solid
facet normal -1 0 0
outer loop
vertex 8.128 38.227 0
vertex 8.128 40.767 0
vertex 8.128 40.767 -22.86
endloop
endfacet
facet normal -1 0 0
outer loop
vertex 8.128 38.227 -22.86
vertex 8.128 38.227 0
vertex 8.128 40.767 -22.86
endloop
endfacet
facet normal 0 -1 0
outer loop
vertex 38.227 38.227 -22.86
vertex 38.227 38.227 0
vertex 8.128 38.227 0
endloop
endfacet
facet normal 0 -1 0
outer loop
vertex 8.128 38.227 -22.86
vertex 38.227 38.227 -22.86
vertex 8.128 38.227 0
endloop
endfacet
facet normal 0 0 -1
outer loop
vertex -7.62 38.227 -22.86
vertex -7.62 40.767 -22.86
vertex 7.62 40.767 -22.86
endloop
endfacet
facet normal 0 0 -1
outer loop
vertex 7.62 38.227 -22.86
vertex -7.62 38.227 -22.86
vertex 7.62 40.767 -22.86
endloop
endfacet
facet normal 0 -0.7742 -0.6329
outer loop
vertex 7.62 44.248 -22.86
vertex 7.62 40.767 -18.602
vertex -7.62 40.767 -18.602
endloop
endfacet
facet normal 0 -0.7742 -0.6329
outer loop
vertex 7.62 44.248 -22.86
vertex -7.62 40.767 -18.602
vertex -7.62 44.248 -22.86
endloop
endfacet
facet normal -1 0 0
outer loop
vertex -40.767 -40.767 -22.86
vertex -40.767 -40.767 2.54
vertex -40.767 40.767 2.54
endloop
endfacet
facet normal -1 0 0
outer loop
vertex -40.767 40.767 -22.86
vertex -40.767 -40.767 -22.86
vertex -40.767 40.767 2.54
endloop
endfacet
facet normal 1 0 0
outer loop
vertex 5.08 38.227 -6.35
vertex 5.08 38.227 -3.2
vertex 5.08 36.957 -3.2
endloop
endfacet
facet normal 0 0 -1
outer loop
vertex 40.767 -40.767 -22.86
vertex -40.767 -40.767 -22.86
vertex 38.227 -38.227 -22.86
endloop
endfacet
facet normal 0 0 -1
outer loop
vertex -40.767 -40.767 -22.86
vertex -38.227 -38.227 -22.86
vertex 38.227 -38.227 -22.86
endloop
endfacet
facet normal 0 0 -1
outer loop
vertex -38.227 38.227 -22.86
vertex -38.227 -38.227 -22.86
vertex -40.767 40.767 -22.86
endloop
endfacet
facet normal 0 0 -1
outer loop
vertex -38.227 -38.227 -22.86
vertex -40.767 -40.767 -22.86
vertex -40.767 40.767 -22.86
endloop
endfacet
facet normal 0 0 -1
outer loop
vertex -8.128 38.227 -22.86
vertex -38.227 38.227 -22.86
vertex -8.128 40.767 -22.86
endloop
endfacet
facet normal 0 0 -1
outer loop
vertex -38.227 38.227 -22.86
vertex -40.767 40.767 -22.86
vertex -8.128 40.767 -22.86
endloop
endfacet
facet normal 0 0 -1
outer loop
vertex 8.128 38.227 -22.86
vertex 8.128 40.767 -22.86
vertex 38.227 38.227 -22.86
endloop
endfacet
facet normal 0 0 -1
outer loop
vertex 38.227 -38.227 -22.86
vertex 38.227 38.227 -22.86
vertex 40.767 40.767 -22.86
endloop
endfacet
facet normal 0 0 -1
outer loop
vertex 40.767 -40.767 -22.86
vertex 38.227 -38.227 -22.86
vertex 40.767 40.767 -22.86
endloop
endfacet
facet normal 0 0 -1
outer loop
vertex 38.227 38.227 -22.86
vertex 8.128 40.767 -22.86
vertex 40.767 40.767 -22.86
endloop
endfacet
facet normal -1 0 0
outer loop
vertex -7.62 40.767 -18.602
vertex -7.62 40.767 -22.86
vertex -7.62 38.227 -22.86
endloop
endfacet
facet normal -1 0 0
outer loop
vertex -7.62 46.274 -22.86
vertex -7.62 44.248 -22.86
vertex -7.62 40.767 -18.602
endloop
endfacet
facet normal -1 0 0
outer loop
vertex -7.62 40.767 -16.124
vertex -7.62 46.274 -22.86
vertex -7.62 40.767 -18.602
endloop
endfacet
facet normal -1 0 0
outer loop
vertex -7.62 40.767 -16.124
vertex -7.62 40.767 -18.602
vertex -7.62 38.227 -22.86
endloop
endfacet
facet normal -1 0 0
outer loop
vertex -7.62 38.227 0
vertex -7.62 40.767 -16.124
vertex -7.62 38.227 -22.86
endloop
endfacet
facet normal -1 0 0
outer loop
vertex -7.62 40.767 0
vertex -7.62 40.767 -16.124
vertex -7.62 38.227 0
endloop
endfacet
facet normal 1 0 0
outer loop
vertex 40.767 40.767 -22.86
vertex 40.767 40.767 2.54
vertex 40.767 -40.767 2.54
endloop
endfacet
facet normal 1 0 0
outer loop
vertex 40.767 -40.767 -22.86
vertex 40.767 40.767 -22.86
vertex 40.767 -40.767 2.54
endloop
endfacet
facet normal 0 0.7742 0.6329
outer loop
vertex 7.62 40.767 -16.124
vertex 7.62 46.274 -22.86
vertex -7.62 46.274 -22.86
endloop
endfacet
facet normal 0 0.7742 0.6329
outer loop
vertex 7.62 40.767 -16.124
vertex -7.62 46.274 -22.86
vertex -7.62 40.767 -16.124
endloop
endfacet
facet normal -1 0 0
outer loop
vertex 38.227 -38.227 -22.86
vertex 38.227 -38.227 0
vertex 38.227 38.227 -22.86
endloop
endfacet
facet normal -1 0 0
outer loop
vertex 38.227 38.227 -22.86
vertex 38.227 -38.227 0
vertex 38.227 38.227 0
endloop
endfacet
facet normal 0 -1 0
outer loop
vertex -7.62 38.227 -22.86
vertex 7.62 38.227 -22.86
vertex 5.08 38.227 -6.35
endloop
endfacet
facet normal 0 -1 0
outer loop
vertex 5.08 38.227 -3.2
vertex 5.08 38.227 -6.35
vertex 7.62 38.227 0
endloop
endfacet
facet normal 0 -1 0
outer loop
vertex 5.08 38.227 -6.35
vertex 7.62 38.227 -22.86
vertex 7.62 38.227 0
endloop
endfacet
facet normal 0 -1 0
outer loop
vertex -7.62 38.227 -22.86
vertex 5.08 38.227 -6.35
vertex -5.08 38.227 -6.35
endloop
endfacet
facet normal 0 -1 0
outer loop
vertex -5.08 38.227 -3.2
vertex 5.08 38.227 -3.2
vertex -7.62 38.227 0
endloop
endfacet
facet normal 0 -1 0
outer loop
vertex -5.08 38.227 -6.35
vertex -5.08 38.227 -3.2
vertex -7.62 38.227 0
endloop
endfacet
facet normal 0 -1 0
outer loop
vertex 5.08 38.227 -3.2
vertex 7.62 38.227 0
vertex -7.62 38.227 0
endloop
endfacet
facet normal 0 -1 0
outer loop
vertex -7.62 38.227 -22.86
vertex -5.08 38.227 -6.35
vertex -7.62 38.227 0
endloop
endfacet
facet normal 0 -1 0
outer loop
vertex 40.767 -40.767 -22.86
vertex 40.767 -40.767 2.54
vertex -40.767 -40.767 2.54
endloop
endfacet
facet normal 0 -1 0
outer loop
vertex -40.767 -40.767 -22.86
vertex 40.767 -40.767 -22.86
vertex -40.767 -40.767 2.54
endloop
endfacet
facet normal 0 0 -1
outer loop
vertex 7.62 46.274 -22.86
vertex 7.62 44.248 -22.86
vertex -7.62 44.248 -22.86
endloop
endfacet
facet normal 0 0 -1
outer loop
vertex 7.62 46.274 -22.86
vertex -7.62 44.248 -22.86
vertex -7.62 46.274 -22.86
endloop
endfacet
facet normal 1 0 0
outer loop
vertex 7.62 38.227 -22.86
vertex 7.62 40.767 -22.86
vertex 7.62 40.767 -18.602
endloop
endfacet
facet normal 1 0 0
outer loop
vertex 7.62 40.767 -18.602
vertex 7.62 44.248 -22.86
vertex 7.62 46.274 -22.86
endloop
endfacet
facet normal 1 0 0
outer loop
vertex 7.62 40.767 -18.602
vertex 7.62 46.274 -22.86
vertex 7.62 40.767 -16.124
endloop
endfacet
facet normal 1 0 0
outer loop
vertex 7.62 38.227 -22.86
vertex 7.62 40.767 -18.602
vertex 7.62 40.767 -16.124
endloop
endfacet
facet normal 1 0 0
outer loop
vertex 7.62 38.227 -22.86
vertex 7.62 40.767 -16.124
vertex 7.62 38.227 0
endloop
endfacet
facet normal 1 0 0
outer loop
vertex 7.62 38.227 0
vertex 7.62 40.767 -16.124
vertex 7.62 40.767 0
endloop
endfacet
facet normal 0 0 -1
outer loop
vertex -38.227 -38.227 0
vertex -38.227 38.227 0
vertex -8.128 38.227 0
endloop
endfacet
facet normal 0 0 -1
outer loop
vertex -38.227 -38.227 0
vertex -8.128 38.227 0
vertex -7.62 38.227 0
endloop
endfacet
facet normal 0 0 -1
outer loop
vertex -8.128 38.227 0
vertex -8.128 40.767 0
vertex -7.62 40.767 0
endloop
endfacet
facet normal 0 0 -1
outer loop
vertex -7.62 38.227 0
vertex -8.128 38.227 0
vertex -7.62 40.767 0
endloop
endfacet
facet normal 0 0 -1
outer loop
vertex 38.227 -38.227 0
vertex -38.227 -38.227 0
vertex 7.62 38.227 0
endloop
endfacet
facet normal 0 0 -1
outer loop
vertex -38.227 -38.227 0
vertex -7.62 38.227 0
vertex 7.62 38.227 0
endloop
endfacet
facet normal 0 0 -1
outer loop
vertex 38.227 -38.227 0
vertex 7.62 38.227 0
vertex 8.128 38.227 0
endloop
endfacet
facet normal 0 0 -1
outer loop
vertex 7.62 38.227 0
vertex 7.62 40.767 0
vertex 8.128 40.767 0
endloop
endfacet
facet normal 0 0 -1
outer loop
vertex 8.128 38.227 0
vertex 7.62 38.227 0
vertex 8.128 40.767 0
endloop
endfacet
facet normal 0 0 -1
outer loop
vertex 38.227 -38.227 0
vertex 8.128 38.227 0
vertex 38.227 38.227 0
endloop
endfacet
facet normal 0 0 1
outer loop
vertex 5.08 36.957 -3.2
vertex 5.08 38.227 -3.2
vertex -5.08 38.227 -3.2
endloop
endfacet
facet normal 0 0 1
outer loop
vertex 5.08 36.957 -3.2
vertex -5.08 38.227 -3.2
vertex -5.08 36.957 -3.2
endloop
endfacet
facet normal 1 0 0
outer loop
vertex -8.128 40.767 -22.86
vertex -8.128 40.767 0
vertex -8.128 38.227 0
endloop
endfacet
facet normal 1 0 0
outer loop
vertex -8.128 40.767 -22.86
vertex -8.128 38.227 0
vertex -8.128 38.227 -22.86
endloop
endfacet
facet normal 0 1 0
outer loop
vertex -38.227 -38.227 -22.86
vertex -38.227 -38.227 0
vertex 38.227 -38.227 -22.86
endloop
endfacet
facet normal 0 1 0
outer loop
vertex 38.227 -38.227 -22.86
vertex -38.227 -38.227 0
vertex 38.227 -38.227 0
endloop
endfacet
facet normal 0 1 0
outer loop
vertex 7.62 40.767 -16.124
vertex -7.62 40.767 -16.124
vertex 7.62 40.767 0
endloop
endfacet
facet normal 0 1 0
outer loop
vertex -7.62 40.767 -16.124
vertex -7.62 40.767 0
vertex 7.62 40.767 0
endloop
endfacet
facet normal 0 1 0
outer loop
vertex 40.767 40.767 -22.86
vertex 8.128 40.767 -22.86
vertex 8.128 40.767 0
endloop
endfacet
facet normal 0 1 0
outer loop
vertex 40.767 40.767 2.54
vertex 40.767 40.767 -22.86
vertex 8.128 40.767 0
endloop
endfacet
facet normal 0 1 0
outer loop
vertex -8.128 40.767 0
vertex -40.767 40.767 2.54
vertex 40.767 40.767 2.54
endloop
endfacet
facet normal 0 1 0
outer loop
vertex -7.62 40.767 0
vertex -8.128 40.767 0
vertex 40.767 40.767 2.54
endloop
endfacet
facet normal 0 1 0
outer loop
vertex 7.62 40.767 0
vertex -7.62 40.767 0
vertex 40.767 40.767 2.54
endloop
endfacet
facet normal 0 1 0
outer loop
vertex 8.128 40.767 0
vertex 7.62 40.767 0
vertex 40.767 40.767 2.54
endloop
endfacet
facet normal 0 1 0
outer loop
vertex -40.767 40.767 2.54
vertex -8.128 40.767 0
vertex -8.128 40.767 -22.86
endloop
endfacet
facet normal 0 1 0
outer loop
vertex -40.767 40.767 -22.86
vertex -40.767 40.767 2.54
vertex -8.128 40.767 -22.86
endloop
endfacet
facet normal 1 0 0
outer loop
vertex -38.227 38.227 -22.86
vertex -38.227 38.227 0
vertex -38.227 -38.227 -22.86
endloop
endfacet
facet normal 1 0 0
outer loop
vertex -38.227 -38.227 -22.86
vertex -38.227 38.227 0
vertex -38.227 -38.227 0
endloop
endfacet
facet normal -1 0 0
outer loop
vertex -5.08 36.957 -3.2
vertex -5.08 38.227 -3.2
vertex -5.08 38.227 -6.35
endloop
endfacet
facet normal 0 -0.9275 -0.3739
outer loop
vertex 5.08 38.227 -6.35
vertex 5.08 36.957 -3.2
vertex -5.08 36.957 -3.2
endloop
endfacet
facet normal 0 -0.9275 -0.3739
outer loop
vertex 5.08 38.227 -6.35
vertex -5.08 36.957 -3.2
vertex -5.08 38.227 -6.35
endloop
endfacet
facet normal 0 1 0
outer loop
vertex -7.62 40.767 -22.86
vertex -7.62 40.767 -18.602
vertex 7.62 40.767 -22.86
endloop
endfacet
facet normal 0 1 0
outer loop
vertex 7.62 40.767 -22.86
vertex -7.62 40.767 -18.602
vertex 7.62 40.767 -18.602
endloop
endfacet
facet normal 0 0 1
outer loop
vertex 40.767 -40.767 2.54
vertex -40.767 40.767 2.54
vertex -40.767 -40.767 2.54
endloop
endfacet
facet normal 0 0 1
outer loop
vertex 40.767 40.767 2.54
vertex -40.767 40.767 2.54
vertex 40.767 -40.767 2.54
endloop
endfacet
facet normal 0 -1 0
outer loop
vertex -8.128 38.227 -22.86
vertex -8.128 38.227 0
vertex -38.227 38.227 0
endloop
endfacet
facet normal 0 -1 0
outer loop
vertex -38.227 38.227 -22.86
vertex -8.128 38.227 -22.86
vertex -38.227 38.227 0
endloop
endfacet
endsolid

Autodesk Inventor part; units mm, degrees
ref_plane "YZ Plane" through (0, 0, 0) normal (1, 0, 0) x (0, 1, 0)
ref_plane "XZ Plane" through (0, 0, 0) normal (0, 1, 0) x (-1, 0, 0)
sketch "Sketch1" plane through (0, 0, 0) normal (0, 0, 1) x (1, 0, 0)
  line L0 (-38.227, 38.227) -> (38.227, 38.227)
  line L1 (38.227, 38.227) -> (38.227, -38.227)
  line L2 (38.227, -38.227) -> (-38.227, -38.227)
  line L3 (-38.227, -38.227) -> (-38.227, 38.227)
  point P0 (0, 0)
  dimension "d0" = 76.454
  dimension "d1" = 76.454
  dimension "d2" = 38.227
  dimension "d3" = 38.227
extrude "Extrusion1" add sketch "Sketch1" along normal blind 2.54
sketch "Sketch2" plane through (0, 0, 2.54) normal (0, 0, 1) x (1, 0, 0)
  line L0 (-38.227, -38.227) -> (38.227, -38.227) projected
  line L1 (38.227, -38.227) -> (38.227, 38.227) projected
  line L2 (38.227, 38.227) -> (-38.227, 38.227) projected
  line L3 (-38.227, 38.227) -> (-38.227, -38.227) projected
  line L4 (-40.767, 40.767) -> (40.767, 40.767)
  line L5 (40.767, 40.767) -> (40.767, -40.767)
  line L6 (40.767, -40.767) -> (-40.767, -40.767)
  line L7 (-40.767, -40.767) -> (-40.767, 40.767)
  point P0 (0, 0)
  dimension "d6" = 2.54
extrude "Extrusion2" add sketch "Sketch2" against normal blind 25.4
sketch "Sketch3" plane through (-40.767, 40.767, 2.54) normal (0, 1, 0) x (1, 0, 0)
  line L0 (81.534, 0) -> (0, 0) projected
  line L1 (81.534, 0) -> (81.534, 25.4) projected
  line L2 (0, 25.4) -> (81.534, 25.4) projected
  line L3 (0, 0) -> (0, 25.4) projected
  line L4 (78.994, 2.54) -> (2.54, 2.54) projected
  line L5 (2.54, 2.54) -> (2.54, 25.4) projected
  line L6 (78.994, 2.54) -> (78.994, 25.4) projected
  line L7 (33.147, 2.54) -> (32.639, 2.54)
  line L8 (32.639, 2.54) -> (32.639, 25.4)
  line L9 (32.639, 25.4) -> (33.147, 25.4)
  line L10 (33.147, 25.4) -> (33.147, 2.54)
  line L11 (78.994, 25.4) -> (2.54, 25.4) projected
  line L12 (48.387, 2.54) -> (48.895, 2.54)
  line L13 (48.895, 2.54) -> (48.895, 25.4)
  line L14 (48.895, 25.4) -> (48.387, 25.4)
  line L15 (48.387, 25.4) -> (48.387, 2.54)
  point P0 (40.767, 2.54)
  point P1 (40.767, 2.54)
  dimension "d9" = 15.24
  dimension "d10" = 7.62
  dimension "d11" = 0.508
  dimension "d12" = 0.508
extrude "Extrusion3" cut sketch "Sketch3" against normal blind 25.4 contours L13 L4 L15 L2 | L2 L10 L4 L8
ref_plane "Work Plane1" through (5.08, 40.767, 0) normal (1, 0, 0) x (0, 0, -1)
sketch "Sketch6" plane through (5.08, 40.767, 0) normal (1, 0, 0) x (0, 0, -1)
  line L0 (0, -2.54) -> (22.86, -2.54) projected
  line L1 (0, 0) -> (0, -2.54) projected
  line L2 (22.86, 0) -> (0, 0) projected
  line L3 (22.86, -2.54) -> (22.86, 0) projected
  line L4 (-2.54, 0) -> (-2.54, -81.534) projected
  line L5 (-2.54, 0) -> (22.86, 0) projected
  line L6 (22.86, -81.534) -> (22.86, 0) projected
  line L7 (-2.54, -81.534) -> (22.86, -81.534) projected
  line L8 (0, -2.54) -> (0, -78.994) projected
  line L9 (0, -78.994) -> (22.86, -78.994) projected
  line L10 (22.86, -2.54) -> (22.86, -78.994) projected
  line L11 (0, -2.54) -> (22.86, -2.54) projected
  line L12 (3.2004, -2.54) -> (3.2004, -3.81)
  line L13 (3.2004, -3.81) -> (6.35, -2.54)
  point P0 (0, -40.767)
  point P1 (6.35, -2.54)
  point P2 (3.2004, -2.54)
  dimension "d20" = 3.2004
  dimension "d21" = 3.1496
  dimension "d22" = 1.27
extrude "Extrusion4" add sketch "Sketch6" against normal blind 10.16 contours L0 L13 L12
sketch "Sketch7" plane through (7.62, 40.767, 0) normal (1, 0, 0) x (0, 0, -1)
  line L0 (0, -2.54) -> (22.86, -2.54) projected
  line L1 (0, 0) -> (0, -2.54) projected
  line L2 (22.86, 0) -> (0, 0) projected
  line L3 (22.86, -2.54) -> (22.86, 0) projected
  line L4 (22.86, 5.5075) -> (16.1237, 0)
  line L5 (-2.54, 0) -> (22.86, 0) projected
  line L6 (18.6021, 0) -> (22.86, 3.4812)
  line L7 (22.86, 3.4812) -> (22.86, 5.5075)
  point P0 (0, -40.767)
extrude "Extrusion5" add sketch "Sketch7" against normal blind 15.24 contours L4 L7 L6 L2
equation "\"d2\" = 0.5 * d1"
equation "\"d3\" = 0.5 * d0"
equation "\"d10\" = 0.5 * d9"
equation "\"d12\" = d11"
properties part number "Part_6_lid"
